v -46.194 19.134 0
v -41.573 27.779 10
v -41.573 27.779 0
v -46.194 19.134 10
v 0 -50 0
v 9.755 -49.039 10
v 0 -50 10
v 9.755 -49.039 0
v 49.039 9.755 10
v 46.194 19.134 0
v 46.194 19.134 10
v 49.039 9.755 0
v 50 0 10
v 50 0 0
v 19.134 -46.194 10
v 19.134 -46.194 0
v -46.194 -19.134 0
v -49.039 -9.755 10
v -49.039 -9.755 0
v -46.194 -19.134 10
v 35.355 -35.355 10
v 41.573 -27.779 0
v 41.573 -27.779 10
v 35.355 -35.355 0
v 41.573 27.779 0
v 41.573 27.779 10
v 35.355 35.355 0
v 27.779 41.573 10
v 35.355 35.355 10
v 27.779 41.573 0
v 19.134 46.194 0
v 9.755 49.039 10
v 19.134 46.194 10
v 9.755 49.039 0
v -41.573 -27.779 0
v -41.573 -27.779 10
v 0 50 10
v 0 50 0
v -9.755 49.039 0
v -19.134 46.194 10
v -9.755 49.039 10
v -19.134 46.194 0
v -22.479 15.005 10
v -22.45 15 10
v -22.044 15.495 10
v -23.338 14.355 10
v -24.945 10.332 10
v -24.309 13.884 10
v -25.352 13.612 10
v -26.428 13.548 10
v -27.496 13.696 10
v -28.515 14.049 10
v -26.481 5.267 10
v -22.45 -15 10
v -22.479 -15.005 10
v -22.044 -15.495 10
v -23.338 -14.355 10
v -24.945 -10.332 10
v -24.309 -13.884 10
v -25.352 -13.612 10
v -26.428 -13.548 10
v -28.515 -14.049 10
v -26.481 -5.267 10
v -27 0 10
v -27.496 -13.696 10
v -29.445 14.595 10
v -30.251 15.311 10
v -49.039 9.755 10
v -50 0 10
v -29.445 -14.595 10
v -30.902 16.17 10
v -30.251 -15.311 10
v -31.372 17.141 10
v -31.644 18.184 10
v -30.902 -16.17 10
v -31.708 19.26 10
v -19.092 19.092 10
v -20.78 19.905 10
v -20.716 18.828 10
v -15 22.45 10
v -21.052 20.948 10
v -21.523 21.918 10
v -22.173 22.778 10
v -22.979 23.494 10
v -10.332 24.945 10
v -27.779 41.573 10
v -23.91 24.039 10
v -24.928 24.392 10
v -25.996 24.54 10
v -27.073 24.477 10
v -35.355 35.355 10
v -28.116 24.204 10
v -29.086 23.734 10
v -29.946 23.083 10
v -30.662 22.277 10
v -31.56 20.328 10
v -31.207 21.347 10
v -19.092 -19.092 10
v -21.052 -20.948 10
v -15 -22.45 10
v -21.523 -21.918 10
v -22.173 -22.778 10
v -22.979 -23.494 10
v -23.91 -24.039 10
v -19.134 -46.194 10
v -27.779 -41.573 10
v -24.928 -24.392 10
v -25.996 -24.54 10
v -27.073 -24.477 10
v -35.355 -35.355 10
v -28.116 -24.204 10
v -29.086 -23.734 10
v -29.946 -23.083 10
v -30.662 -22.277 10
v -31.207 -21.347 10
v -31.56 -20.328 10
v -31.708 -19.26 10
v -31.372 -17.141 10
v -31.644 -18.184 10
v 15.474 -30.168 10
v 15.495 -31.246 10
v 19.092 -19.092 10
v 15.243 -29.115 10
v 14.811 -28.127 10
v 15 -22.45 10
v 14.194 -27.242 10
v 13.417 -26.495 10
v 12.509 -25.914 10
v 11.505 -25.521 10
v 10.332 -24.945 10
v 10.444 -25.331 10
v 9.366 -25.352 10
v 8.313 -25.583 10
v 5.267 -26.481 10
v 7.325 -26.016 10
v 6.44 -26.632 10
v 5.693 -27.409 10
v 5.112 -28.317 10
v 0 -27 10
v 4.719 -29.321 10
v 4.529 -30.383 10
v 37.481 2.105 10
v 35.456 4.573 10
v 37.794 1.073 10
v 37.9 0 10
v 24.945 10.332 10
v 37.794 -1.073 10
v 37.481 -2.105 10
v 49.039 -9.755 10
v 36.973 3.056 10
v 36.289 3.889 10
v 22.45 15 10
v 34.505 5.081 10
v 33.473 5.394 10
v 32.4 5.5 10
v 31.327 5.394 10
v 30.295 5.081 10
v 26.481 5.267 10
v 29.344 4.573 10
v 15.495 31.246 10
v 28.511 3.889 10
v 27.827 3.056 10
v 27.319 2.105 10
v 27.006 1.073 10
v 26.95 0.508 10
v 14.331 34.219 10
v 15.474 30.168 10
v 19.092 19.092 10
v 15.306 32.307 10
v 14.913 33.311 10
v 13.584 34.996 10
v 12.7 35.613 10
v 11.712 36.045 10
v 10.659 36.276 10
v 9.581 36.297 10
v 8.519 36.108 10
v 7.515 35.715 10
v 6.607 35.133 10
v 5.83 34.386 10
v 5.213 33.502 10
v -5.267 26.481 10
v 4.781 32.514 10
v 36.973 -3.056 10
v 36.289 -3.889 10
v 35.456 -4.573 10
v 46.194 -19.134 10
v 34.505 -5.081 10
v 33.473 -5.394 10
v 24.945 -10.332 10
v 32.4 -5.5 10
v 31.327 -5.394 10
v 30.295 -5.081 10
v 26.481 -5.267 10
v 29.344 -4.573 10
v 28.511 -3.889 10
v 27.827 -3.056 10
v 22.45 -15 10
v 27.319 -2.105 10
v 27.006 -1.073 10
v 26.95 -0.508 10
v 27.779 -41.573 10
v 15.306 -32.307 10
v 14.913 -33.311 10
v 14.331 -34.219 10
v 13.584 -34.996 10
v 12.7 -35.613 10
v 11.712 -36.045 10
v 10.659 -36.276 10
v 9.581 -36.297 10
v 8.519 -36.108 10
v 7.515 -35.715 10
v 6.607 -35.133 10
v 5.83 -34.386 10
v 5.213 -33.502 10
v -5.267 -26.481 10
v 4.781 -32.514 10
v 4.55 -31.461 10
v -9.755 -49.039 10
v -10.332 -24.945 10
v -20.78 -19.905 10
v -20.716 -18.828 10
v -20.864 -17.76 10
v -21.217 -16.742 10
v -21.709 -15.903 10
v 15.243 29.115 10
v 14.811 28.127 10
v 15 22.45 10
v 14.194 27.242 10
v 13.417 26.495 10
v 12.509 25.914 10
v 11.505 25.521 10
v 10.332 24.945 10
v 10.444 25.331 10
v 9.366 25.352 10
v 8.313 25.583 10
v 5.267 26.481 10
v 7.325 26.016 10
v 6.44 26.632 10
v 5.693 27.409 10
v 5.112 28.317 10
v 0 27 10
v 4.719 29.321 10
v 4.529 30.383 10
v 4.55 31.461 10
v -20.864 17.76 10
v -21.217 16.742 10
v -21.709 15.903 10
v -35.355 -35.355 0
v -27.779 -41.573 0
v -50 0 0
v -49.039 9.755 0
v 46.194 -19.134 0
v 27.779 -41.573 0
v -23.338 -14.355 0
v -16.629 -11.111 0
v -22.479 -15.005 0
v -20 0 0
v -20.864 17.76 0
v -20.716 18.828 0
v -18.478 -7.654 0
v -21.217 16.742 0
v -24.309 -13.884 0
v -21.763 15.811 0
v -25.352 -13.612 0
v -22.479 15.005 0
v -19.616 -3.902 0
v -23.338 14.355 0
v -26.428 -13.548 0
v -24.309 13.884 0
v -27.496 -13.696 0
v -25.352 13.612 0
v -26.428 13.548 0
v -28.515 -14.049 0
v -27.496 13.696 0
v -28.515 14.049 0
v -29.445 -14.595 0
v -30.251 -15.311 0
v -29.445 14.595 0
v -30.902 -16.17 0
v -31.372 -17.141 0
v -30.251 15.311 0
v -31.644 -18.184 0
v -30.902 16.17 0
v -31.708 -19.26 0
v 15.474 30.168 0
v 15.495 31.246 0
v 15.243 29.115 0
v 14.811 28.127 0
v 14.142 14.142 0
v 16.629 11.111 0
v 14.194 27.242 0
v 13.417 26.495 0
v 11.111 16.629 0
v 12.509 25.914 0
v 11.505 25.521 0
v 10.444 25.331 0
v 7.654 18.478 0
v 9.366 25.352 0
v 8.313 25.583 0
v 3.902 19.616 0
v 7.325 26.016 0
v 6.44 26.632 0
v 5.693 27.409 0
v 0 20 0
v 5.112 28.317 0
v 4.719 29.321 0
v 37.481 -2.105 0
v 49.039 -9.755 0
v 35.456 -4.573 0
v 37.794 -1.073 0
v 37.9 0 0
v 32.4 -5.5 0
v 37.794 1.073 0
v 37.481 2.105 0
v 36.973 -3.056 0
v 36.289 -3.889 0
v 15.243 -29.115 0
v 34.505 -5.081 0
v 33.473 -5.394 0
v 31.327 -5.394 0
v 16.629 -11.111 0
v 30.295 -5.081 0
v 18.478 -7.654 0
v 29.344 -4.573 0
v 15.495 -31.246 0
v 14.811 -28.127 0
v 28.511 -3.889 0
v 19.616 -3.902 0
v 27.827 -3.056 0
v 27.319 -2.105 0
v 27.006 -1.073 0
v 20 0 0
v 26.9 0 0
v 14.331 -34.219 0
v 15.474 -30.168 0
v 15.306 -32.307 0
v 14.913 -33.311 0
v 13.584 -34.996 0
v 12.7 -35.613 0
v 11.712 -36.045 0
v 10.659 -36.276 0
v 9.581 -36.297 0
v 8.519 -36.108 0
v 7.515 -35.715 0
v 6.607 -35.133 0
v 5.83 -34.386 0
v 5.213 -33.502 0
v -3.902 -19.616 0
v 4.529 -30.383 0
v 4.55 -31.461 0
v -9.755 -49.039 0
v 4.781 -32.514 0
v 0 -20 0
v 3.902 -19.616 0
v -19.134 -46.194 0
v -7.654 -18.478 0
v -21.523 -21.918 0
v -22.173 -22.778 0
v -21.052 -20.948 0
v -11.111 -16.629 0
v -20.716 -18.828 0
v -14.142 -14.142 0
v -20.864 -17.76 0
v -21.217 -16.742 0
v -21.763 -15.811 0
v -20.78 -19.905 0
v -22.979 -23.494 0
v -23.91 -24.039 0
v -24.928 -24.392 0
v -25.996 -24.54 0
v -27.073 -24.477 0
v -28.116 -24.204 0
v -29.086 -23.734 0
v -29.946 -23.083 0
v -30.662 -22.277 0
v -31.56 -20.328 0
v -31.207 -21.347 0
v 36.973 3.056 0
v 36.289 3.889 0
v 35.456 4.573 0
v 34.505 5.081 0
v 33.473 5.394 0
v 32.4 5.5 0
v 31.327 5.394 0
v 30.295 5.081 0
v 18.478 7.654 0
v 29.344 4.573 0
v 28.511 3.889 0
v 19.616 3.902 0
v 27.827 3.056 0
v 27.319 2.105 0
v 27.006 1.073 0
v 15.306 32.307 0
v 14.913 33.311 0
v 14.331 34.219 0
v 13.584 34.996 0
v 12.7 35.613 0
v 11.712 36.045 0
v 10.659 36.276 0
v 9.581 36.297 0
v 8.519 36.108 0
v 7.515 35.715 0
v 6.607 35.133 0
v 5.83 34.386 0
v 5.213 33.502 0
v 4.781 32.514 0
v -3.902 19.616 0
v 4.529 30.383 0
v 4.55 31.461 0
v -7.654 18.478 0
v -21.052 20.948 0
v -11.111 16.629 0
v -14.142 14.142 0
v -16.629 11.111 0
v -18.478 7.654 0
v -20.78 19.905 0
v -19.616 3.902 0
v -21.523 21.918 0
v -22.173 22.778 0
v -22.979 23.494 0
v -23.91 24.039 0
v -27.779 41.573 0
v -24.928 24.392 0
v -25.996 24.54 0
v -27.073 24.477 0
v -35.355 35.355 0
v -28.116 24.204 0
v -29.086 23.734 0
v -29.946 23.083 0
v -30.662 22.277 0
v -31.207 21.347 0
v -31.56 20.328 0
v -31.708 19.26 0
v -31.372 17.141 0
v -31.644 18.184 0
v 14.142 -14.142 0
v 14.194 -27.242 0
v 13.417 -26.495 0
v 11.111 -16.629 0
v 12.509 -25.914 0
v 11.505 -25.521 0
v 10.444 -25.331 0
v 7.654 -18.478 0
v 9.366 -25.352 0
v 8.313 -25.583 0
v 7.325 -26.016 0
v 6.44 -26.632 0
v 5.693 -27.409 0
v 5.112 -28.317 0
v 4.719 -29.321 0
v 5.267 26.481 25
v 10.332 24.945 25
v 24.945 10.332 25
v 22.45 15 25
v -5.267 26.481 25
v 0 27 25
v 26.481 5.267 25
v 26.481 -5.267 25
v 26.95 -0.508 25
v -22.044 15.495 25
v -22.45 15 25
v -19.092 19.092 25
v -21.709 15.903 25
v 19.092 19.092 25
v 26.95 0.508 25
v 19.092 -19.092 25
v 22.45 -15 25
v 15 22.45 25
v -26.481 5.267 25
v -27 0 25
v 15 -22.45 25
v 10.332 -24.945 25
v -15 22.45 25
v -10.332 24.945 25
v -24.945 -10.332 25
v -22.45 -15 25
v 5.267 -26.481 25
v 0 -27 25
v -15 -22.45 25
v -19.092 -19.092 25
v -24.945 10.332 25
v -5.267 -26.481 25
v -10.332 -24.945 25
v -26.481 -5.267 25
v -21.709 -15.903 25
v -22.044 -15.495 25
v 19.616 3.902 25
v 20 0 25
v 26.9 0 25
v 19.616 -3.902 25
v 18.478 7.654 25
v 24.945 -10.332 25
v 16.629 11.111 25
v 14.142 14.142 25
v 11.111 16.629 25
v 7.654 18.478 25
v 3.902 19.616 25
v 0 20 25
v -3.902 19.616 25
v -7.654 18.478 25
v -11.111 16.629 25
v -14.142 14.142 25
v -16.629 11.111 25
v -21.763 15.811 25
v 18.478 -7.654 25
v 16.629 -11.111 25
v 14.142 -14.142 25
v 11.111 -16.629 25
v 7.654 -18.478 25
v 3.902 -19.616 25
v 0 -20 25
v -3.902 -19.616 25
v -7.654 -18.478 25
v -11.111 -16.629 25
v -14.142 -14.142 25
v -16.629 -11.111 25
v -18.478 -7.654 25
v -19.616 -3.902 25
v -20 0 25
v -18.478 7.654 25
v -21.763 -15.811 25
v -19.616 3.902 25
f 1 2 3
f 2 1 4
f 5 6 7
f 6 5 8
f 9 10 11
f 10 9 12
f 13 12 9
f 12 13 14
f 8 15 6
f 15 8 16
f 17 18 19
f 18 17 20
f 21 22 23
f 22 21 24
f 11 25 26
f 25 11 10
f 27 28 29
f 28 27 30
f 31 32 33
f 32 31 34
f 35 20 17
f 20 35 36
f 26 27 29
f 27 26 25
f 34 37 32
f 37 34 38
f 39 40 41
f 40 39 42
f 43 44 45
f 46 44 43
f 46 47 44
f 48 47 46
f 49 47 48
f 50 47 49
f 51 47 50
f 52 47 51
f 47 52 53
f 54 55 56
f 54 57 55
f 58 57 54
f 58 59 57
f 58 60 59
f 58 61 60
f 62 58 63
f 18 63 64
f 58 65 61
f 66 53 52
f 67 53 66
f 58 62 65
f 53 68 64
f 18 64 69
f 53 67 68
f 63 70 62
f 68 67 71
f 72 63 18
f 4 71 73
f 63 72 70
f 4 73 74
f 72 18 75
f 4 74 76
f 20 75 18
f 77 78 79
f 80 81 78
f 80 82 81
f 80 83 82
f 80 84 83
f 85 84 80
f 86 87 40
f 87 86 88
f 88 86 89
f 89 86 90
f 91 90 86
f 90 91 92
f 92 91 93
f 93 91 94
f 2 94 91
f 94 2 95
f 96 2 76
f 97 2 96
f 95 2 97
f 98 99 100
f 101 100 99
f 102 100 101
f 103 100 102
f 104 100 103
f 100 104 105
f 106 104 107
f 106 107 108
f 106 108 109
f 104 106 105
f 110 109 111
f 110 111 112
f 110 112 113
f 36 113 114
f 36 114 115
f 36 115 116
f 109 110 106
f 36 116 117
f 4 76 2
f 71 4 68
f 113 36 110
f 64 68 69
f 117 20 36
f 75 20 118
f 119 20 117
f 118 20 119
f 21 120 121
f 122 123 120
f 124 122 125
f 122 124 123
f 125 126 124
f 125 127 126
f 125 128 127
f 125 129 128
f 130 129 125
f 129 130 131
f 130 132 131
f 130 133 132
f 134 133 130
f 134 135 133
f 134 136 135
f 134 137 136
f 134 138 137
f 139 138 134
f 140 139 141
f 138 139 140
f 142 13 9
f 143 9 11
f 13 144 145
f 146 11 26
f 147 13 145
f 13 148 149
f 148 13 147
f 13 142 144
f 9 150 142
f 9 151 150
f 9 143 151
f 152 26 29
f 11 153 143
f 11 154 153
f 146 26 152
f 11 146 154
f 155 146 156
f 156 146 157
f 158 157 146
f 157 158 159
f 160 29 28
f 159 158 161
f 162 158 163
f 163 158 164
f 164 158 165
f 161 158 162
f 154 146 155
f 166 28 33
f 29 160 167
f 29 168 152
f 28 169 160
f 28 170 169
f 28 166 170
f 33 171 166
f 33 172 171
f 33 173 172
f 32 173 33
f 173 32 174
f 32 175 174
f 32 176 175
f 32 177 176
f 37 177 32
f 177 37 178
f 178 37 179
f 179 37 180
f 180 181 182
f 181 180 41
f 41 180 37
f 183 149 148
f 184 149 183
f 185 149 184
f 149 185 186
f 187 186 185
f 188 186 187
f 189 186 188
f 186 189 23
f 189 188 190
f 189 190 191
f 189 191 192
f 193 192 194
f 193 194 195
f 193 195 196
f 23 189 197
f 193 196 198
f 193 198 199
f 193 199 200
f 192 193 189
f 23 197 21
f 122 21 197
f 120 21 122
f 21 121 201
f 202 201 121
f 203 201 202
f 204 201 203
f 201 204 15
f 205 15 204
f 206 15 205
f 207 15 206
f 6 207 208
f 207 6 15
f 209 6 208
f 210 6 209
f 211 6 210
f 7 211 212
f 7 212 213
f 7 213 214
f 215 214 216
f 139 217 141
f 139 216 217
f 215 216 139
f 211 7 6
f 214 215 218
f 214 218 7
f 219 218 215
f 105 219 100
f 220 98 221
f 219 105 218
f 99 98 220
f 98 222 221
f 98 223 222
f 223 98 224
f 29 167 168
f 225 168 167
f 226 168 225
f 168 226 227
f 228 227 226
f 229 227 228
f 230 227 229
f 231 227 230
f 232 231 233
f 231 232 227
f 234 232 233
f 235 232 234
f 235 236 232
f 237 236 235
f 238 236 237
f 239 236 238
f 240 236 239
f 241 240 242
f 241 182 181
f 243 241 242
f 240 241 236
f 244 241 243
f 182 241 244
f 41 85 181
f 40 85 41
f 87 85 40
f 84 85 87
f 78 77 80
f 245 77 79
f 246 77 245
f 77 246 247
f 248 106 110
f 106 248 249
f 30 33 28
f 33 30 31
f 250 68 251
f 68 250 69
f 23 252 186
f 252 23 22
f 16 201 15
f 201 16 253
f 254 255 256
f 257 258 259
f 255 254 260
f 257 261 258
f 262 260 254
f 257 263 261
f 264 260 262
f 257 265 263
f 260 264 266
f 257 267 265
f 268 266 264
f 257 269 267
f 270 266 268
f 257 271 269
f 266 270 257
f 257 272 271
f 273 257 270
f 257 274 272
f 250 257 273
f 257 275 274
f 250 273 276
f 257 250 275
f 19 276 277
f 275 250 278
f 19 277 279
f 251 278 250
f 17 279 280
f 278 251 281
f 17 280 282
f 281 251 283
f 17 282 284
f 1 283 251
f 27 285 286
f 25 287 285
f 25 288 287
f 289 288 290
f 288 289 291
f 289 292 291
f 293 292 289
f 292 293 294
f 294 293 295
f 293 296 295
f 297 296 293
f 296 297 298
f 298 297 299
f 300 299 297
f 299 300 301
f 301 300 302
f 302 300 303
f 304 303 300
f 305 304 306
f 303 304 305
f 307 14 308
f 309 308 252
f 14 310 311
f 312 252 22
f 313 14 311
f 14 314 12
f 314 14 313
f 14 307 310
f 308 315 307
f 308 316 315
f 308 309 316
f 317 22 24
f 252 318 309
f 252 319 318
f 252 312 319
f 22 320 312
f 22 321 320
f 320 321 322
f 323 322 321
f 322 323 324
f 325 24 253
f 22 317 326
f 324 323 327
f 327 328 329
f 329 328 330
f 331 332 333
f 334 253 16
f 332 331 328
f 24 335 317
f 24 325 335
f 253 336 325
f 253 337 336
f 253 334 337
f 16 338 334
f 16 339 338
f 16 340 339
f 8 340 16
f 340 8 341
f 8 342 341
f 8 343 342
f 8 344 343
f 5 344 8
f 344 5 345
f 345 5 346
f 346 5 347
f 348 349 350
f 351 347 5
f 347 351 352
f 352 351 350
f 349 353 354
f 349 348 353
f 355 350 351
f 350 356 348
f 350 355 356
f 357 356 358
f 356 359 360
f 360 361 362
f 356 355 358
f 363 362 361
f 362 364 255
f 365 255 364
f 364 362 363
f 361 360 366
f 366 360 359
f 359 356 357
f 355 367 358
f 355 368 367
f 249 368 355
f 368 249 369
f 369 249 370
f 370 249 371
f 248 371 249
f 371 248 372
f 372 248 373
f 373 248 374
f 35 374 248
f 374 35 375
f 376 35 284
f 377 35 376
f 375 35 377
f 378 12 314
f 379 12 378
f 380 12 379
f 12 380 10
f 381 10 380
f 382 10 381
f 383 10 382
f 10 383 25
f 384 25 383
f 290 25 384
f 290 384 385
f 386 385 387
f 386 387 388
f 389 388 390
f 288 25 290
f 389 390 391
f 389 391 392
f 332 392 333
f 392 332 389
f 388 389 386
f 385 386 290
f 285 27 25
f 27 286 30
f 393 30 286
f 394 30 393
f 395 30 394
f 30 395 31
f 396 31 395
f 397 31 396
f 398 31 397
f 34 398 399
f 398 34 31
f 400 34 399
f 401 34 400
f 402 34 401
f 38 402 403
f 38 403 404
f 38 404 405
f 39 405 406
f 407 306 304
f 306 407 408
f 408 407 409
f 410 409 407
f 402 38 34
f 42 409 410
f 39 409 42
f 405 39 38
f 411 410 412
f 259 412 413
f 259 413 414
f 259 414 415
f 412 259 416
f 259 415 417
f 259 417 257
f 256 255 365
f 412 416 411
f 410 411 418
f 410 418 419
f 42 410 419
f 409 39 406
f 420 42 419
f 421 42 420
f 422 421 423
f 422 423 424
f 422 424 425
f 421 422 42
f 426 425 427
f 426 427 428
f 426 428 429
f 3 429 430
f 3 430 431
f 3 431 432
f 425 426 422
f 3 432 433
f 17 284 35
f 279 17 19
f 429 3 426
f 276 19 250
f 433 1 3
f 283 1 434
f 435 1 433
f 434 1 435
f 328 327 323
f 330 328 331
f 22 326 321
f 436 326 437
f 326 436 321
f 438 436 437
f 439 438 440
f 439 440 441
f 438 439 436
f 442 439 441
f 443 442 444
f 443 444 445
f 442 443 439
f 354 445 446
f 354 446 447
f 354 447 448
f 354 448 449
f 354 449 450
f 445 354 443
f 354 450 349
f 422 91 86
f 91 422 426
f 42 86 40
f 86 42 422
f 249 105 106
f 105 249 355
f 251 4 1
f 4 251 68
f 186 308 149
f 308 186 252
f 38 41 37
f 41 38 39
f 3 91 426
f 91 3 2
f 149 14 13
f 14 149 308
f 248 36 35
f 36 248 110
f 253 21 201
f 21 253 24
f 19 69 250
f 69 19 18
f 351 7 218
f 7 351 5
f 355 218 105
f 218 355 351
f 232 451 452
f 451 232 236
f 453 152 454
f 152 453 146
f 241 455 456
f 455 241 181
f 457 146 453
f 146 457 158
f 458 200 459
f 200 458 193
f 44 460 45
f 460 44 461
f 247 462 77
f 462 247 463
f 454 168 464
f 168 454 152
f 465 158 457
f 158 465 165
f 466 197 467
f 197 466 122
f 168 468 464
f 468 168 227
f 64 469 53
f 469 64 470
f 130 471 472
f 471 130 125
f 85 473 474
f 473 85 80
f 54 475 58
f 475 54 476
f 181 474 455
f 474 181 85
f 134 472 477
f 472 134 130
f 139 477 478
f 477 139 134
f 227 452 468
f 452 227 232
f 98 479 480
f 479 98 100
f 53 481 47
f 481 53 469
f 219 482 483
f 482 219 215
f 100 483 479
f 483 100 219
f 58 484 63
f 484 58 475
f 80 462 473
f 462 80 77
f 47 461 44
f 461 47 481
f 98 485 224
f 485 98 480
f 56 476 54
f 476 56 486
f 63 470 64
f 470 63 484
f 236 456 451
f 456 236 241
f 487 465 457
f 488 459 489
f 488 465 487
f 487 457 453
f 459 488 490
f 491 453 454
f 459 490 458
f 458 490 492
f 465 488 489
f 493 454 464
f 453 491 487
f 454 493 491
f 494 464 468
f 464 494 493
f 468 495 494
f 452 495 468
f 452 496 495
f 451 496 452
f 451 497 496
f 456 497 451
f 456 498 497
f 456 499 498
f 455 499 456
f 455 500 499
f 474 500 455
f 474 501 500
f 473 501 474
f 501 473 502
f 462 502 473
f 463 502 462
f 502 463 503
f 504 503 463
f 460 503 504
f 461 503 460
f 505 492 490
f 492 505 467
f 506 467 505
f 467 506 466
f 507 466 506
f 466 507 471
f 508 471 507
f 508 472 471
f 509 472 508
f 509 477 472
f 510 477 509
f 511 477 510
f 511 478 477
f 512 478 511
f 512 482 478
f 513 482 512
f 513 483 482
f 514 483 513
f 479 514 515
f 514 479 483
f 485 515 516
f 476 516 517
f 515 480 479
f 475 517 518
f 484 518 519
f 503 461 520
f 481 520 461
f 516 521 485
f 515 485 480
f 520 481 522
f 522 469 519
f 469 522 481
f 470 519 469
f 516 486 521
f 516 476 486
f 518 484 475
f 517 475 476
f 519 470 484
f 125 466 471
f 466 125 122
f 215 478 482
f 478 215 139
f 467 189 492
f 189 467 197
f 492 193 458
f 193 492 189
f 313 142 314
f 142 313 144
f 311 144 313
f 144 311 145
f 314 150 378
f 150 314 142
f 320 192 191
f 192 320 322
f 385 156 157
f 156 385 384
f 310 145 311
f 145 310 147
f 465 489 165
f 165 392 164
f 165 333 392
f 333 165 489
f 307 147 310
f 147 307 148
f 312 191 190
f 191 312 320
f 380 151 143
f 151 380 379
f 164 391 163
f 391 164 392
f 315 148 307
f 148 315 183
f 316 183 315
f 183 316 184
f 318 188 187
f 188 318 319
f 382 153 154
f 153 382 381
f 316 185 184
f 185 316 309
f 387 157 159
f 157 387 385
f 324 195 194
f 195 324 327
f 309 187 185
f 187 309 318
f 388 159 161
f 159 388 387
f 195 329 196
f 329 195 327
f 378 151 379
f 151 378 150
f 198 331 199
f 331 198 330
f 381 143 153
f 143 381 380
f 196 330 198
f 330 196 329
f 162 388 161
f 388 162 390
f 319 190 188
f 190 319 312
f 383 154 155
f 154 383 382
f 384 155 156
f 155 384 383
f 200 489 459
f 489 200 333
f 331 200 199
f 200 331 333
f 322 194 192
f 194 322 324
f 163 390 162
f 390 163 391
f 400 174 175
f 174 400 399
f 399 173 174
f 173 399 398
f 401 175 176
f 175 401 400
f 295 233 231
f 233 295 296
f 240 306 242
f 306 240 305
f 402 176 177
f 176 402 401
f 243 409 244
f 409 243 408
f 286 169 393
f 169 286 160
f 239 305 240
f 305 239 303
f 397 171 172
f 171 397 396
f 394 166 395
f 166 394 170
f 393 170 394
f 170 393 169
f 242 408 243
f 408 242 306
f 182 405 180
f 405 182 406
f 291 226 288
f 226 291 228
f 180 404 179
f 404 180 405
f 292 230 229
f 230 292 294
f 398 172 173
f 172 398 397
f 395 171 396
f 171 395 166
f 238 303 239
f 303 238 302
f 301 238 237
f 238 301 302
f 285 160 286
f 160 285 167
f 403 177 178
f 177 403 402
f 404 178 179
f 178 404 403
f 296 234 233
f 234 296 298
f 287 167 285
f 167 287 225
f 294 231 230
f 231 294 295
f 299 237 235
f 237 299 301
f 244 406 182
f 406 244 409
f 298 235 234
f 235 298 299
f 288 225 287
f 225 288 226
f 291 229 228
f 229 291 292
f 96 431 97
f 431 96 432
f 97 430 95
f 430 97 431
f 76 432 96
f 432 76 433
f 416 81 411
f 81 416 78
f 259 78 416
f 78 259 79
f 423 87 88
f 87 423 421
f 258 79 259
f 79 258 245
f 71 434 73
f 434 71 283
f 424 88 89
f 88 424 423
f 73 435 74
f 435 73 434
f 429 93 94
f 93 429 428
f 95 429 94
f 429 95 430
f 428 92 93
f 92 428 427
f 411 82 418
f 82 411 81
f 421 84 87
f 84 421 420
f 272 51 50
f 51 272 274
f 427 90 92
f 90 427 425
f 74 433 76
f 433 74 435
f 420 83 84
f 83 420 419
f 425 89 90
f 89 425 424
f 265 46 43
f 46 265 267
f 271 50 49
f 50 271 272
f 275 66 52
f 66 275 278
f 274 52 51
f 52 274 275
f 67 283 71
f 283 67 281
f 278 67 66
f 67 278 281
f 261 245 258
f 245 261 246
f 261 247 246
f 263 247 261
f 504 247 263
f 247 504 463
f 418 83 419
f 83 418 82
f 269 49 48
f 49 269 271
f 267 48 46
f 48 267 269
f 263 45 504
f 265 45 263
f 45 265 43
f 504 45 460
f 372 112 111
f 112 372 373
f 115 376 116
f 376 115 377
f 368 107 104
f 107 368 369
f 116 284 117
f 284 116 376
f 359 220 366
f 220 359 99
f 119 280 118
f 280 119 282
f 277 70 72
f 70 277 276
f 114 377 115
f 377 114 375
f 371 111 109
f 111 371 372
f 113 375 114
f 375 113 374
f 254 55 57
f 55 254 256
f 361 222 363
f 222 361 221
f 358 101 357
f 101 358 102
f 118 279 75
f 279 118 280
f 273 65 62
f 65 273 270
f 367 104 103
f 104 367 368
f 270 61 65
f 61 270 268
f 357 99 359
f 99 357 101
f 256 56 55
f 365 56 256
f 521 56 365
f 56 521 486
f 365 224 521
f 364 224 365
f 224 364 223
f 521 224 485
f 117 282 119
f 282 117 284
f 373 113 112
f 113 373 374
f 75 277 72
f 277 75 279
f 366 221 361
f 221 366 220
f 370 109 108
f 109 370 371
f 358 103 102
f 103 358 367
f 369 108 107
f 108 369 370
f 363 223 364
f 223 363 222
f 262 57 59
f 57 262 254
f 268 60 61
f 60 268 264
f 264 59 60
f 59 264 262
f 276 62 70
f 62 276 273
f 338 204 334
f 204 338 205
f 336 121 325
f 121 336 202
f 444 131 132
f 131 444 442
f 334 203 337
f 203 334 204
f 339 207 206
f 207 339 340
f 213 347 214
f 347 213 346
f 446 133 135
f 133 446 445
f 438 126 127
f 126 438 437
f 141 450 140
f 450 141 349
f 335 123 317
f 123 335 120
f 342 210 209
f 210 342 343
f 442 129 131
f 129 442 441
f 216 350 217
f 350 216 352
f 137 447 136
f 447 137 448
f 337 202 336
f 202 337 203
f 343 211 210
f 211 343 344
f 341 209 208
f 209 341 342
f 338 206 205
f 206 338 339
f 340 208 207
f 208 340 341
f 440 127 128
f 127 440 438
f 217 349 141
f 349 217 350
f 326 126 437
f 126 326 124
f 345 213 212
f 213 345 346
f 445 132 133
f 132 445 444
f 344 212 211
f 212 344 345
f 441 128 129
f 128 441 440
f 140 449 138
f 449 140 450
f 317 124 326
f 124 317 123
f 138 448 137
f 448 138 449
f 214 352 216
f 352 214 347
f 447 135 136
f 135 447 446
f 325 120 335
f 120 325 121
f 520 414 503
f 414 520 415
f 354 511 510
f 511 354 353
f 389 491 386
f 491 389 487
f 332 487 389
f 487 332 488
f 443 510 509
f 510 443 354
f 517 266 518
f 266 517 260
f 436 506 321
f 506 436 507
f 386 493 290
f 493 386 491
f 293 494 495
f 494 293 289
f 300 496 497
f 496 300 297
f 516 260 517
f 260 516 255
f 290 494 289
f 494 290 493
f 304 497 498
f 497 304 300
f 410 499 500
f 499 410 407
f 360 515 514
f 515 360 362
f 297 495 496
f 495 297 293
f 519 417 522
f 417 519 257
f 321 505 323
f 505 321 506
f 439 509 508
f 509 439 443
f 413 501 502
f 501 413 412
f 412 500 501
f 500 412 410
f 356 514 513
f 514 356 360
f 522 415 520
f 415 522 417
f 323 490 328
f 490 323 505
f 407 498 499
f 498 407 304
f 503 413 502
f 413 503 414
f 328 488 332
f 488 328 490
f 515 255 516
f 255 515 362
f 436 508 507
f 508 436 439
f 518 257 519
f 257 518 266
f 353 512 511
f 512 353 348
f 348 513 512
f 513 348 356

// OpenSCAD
$fn = 32;

// ----------------------------------------------------------------------
// Bolt-circle flange: 100 mm outside, 5 bolt holes, bore 40 mm
// ----------------------------------------------------------------------

// --- parameters (mm) ---
flange_d = 100;           // flange outside diameter
flange_t = 10;            // flange thickness
bolts = 5;                // number of bolt holes
bolt_d = 11;              // bolt clearance
bolt_r = 32.4;            // bolt circle radius
bore_d = 40;              // centre bore
hub_d = 54;               // raised hub diameter
hub_h = 15;               // raised hub height

module body() {
  cylinder(h = flange_t, d = flange_d);
  /* raised hub, sunk 1 mm into the flange */
  translate([0, 0, flange_t - 1]) cylinder(h = hub_h + 1, d = hub_d);
}

difference() {
  body();
  /* bolt circle */
  for (i = [0 : bolts - 1]) rotate([0, 0, i * 360 / bolts]) translate([bolt_r, 0, -1]) cylinder(h = flange_t + hub_h + 3, d = bolt_d);
  translate([0, 0, -1]) cylinder(h = flange_t + hub_h + 3, d = bore_d);
}
